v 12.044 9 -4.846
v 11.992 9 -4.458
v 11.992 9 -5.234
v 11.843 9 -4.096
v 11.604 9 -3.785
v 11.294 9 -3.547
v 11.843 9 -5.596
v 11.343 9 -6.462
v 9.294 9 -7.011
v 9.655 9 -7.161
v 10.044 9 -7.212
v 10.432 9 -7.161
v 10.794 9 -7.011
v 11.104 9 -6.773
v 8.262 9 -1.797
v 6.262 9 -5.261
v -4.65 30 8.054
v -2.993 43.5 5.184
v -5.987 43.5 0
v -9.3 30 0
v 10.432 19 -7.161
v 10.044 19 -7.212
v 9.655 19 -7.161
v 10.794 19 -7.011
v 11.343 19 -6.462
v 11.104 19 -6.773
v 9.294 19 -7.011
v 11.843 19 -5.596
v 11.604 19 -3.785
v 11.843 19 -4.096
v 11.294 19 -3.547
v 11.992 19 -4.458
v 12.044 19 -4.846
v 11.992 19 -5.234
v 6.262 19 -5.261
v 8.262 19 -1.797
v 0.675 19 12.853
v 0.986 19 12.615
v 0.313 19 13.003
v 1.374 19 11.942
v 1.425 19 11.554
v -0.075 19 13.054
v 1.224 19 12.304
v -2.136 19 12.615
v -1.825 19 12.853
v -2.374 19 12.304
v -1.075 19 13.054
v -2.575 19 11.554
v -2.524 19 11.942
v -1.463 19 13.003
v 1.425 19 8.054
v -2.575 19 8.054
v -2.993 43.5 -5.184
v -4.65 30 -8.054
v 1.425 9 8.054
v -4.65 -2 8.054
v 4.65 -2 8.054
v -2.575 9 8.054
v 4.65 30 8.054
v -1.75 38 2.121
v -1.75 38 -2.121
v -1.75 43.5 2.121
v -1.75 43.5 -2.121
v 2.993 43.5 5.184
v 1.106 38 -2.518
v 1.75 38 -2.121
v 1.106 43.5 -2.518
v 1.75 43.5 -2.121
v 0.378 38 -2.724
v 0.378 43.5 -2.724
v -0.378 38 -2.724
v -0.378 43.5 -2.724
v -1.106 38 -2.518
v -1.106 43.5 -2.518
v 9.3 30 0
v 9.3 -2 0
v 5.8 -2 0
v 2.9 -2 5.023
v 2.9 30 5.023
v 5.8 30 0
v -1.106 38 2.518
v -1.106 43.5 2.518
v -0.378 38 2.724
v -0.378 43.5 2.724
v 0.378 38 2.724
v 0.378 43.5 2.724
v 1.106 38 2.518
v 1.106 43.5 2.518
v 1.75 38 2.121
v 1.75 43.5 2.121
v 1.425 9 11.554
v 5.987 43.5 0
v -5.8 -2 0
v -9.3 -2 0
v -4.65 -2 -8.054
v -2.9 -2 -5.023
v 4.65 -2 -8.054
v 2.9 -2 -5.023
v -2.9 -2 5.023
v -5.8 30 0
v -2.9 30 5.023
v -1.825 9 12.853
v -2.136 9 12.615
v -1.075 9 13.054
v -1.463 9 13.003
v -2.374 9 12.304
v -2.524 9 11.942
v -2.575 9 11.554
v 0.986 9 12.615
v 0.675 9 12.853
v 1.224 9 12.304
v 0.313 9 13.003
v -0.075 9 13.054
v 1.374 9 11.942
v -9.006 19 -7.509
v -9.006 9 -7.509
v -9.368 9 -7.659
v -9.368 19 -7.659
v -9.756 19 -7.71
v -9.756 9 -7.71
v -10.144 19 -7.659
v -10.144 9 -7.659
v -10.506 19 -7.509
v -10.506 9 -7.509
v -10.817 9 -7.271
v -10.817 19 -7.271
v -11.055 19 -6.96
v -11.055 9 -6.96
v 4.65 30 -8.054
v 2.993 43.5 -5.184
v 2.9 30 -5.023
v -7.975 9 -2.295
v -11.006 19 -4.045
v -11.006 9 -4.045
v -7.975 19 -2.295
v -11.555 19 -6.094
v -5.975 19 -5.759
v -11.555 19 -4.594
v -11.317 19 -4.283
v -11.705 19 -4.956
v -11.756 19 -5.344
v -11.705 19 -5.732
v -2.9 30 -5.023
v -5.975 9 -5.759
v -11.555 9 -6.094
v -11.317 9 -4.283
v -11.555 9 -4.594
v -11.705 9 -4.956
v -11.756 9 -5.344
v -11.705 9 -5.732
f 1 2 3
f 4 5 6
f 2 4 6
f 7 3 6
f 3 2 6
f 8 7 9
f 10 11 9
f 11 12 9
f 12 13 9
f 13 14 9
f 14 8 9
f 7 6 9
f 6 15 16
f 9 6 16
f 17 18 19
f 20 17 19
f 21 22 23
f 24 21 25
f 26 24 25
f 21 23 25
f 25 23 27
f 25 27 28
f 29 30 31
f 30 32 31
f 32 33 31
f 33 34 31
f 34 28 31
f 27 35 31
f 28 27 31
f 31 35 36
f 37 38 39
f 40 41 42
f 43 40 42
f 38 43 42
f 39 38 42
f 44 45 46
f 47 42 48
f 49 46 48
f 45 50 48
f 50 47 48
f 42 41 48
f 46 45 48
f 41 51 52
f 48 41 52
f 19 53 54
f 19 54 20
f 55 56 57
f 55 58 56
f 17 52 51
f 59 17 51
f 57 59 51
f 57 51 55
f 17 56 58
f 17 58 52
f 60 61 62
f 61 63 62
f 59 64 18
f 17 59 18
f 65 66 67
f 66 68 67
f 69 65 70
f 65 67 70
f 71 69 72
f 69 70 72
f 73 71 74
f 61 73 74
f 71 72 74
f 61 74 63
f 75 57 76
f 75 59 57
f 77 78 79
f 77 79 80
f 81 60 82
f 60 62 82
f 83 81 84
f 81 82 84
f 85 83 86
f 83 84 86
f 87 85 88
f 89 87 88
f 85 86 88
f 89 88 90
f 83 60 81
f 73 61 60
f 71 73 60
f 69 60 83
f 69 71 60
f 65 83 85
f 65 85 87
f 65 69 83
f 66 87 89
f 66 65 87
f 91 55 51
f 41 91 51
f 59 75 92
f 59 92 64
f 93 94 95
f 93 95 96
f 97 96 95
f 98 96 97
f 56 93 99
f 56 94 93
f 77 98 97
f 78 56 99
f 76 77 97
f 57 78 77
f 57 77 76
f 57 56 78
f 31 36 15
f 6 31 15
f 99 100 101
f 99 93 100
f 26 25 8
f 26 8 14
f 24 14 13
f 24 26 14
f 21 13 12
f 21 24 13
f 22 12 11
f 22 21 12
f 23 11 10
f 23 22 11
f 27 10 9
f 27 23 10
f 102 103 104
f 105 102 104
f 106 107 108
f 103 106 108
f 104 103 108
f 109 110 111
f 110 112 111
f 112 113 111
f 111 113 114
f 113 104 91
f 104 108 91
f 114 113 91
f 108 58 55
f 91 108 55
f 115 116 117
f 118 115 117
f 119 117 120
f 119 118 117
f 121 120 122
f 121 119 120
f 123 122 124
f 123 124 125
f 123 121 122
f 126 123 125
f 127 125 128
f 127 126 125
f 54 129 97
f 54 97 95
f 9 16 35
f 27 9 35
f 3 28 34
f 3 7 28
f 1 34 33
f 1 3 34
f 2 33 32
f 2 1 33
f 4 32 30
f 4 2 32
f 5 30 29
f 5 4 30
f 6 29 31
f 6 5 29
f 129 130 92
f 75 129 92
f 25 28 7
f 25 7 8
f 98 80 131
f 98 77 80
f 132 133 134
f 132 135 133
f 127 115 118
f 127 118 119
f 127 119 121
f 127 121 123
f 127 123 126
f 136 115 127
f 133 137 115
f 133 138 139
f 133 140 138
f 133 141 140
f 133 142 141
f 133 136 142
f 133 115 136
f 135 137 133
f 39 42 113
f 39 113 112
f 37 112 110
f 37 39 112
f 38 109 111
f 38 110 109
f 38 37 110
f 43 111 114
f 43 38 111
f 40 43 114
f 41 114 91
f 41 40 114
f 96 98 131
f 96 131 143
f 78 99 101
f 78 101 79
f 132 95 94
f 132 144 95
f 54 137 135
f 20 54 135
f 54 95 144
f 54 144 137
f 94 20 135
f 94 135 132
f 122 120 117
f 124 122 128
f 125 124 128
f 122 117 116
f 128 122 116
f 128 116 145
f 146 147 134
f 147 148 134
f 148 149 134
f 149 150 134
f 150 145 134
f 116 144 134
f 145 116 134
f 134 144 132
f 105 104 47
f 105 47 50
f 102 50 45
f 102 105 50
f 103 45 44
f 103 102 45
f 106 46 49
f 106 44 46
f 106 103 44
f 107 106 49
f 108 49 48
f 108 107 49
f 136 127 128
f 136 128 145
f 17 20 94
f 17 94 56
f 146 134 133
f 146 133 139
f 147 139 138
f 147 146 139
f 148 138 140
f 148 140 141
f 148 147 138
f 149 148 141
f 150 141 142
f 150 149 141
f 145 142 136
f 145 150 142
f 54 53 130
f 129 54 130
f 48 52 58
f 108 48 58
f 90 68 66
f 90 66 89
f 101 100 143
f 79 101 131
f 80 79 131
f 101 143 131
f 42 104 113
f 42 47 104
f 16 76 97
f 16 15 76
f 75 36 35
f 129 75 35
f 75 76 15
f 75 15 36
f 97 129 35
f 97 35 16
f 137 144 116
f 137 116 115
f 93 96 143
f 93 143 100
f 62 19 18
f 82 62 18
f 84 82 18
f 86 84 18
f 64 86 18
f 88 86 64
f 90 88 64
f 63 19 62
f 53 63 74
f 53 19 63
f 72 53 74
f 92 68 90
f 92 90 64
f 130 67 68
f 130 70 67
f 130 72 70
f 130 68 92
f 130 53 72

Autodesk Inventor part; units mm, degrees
ref_plane "YZ Plane" through (0, 0, 0) normal (1, 0, 0) x (0, 1, 0)
ref_plane "XZ Plane" through (0, 0, 0) normal (0, 1, 0) x (-1, 0, 0)
ref_plane "XY Plane" through (0, 0, 0) normal (0, 0, 1) x (1, 0, 0)
sketch "Boceto1" plane through (0, 0, 0) normal (0, 1, 0) x (-1, 0, 0)
  line L0 (0, 0) -> (5.8, 0)
  line L1 (5.8, 0) -> (9.3, 0)
  line L2 (5.8, 0) -> (2.9, -5.0229)
  line L3 (2.9, -5.0229) -> (-2.9, -5.0229)
  line L4 (-2.9, -5.0229) -> (-5.8, 0)
  line L5 (-5.8, 0) -> (-2.9, 5.0229)
  line L6 (-2.9, 5.0229) -> (2.9, 5.0229)
  line L7 (2.9, 5.0229) -> (5.8, 0)
  line L8 (9.3, 0) -> (4.65, -8.054)
  line L9 (4.65, -8.054) -> (-4.65, -8.054)
  line L10 (-4.65, -8.054) -> (-9.3, 0)
  line L11 (-9.3, 0) -> (-4.65, 8.054)
  line L12 (-4.65, 8.054) -> (4.65, 8.054)
  line L13 (4.65, 8.054) -> (9.3, 0)
  dimension "d0" = 5.8
  dimension "d1" = 3.5
extrude "Extrusión1" add sketch "Boceto1" along normal blind 30
sketch "Boceto2" plane through (0, 30, 0) normal (0, 1, 0) x (1, 0, 0)
  line L0 (-4.65, 8.054) -> (-9.3, 0) projected
  line L1 (-9.3, 0) -> (-4.65, 8.054)
  line L2 (-4.65, 8.054) -> (4.65, 8.054)
  line L3 (4.65, 8.054) -> (9.3, 0)
  line L4 (9.3, 0) -> (4.65, -8.054)
  line L5 (4.65, -8.054) -> (-4.65, -8.054)
  line L6 (-4.65, -8.054) -> (-9.3, 0)
  point P0 (0, 0)
  point P1 (0, 0)
extrude "Extrusión2" add sketch "Boceto2" along normal blind 13.5 draft -12
sketch "Boceto3" plane through (0, 0, 0) normal (0, -1, 0) x (1, 0, 0)
  line L0 (9.3, 0) -> (5.9866, 0) projected
  line L1 (9.3, 0) -> (4.65, -8.054)
  line L2 (4.65, -8.054) -> (-4.65, -8.054)
  line L3 (-4.65, -8.054) -> (-9.3, 0)
  line L4 (-9.3, 0) -> (-4.65, 8.054)
  line L5 (-4.65, 8.054) -> (4.65, 8.054)
  line L6 (4.65, 8.054) -> (9.3, 0)
  point P0 (0, 0)
  point P1 (0, 0)
sketch "Boceto4" plane through (0, 0, 0) normal (0, -1, 0) x (1, 0, 0)
  line L0 (5.8, 0) -> (2.9, -5.0229)
  line L1 (2.9, -5.0229) -> (-2.9, -5.0229)
  line L2 (-2.9, -5.0229) -> (-5.8, 0)
  line L3 (-5.8, 0) -> (-2.9, 5.0229)
  line L4 (-2.9, 5.0229) -> (2.9, 5.0229)
  line L5 (2.9, 5.0229) -> (5.8, 0)
  point P0 (0, 0)
  point P1 (0, 0)
extrude "Extrusión3" add sketch "Boceto3" along normal blind 2
sketch "Boceto5" plane through (0, -2, 0) normal (0, -1, 0) x (1, 0, 0)
  line L0 (0, 0) -> (5.8, 0)
  line L1 (5.8, 0) -> (2.9, -5.0229)
  line L2 (2.9, -5.0229) -> (-2.9, -5.0229)
  line L3 (-2.9, -5.0229) -> (-5.8, 0)
  line L4 (-5.8, 0) -> (-2.9, 5.0229)
  line L5 (-2.9, 5.0229) -> (2.9, 5.0229)
  line L6 (2.9, 5.0229) -> (5.8, 0)
  dimension "d8" = 5.8
extrude "Extrusión4" cut sketch "Boceto5" against normal blind 2
sketch "Boceto6" plane through (0, 43.5, 0) normal (0, 1, 0) x (1, 0, 0)
  line L0 (-1.75, 0) -> (-1.75, 2.1213)
  line L1 (-1.75, 0) -> (-1.75, -2.1213)
  line L2 (1.75, 0) -> (1.75, 2.1213)
  line L3 (1.75, 0) -> (1.75, -2.1213)
  arc A0 (-1.75, -2.1213) -> (1.75, -2.1213) centre (0, 0) ccw
  arc A1 (1.75, 2.1213) -> (-1.75, 2.1213) centre (0, 0) ccw
extrude "Extrusión5" cut sketch "Boceto6" against normal blind 5.5
sketch "Boceto8" plane through (-9.3, -2, 0) normal (-0.8660254, 0, -0.5) x (-0.5, 0, 0.8660254)
  line L0 (-4.65, 11) -> (-2.65, 11)
  line L1 (-4.65, 11) -> (-6.65, 11)
  line L2 (-6.65, 21) -> (-2.65, 21)
  line L3 (-2.65, 21) -> (-2.65, 11)
  line L4 (-6.65, 11) -> (-6.65, 21)
extrude "Extrusión7" add sketch "Boceto8" along normal blind 5
fillet "Empalme2" radius 1.5 2 edges at (-12.3051, 14, -4.795) (-10.3051, 14, -8.2591)
sketch "Boceto9" plane through (4.075, -2, 8.054) normal (0, 0, 1) x (1, 0, 0)
  line L0 (0, 0) -> (0, 32)
  line L1 (0, 0) -> (0, 16)
  line L2 (-1.75, 32) -> (1.15, 32)
  line L3 (-9.3, 32) -> (-9.3, 0)
  line L4 (-4.65, 11) -> (-6.65, 11)
  line L5 (-6.65, 11) -> (-2.65, 11)
  line L6 (-2.65, 11) -> (-2.65, 21)
  line L7 (-2.65, 21) -> (-4.65, 21)
  line L8 (-4.65, 21) -> (-6.65, 21)
  line L9 (-6.65, 21) -> (-6.65, 11)
  point P0 (-4.65, 2)
extrude "Extrusión8" add sketch "Boceto9" along normal blind 5
sketch "Boceto10" plane through (4.9375, -2, -7.5561) normal (0.8660254, 0, -0.5) x (-0.5, 0, -0.8660254)
  line L0 (0, 0) -> (0, 32)
  line L1 (0, 0) -> (0, 16)
  line L2 (-1.75, 32) -> (1.15, 32)
  line L3 (-9.3, 32) -> (-9.3, 0)
  line L4 (-4.65, 11) -> (-6.65, 11)
  line L5 (-6.65, 11) -> (-2.65, 11)
  line L6 (-2.65, 11) -> (-2.65, 21)
  line L7 (-2.65, 21) -> (-4.65, 21)
  line L8 (-4.65, 21) -> (-6.65, 21)
  line L9 (-6.65, 21) -> (-6.65, 11)
  point P0 (-4.65, 2)
extrude "Extrusión9" add sketch "Boceto10" along normal blind 5
fillet "Empalme3" radius 1.5 4 edges at (-2.575, 14, 13.054) (1.425, 14, 13.054) (12.5926, 14, -4.297) (10.5926, 14, -7.7611)
properties part number "acopladorV4"
